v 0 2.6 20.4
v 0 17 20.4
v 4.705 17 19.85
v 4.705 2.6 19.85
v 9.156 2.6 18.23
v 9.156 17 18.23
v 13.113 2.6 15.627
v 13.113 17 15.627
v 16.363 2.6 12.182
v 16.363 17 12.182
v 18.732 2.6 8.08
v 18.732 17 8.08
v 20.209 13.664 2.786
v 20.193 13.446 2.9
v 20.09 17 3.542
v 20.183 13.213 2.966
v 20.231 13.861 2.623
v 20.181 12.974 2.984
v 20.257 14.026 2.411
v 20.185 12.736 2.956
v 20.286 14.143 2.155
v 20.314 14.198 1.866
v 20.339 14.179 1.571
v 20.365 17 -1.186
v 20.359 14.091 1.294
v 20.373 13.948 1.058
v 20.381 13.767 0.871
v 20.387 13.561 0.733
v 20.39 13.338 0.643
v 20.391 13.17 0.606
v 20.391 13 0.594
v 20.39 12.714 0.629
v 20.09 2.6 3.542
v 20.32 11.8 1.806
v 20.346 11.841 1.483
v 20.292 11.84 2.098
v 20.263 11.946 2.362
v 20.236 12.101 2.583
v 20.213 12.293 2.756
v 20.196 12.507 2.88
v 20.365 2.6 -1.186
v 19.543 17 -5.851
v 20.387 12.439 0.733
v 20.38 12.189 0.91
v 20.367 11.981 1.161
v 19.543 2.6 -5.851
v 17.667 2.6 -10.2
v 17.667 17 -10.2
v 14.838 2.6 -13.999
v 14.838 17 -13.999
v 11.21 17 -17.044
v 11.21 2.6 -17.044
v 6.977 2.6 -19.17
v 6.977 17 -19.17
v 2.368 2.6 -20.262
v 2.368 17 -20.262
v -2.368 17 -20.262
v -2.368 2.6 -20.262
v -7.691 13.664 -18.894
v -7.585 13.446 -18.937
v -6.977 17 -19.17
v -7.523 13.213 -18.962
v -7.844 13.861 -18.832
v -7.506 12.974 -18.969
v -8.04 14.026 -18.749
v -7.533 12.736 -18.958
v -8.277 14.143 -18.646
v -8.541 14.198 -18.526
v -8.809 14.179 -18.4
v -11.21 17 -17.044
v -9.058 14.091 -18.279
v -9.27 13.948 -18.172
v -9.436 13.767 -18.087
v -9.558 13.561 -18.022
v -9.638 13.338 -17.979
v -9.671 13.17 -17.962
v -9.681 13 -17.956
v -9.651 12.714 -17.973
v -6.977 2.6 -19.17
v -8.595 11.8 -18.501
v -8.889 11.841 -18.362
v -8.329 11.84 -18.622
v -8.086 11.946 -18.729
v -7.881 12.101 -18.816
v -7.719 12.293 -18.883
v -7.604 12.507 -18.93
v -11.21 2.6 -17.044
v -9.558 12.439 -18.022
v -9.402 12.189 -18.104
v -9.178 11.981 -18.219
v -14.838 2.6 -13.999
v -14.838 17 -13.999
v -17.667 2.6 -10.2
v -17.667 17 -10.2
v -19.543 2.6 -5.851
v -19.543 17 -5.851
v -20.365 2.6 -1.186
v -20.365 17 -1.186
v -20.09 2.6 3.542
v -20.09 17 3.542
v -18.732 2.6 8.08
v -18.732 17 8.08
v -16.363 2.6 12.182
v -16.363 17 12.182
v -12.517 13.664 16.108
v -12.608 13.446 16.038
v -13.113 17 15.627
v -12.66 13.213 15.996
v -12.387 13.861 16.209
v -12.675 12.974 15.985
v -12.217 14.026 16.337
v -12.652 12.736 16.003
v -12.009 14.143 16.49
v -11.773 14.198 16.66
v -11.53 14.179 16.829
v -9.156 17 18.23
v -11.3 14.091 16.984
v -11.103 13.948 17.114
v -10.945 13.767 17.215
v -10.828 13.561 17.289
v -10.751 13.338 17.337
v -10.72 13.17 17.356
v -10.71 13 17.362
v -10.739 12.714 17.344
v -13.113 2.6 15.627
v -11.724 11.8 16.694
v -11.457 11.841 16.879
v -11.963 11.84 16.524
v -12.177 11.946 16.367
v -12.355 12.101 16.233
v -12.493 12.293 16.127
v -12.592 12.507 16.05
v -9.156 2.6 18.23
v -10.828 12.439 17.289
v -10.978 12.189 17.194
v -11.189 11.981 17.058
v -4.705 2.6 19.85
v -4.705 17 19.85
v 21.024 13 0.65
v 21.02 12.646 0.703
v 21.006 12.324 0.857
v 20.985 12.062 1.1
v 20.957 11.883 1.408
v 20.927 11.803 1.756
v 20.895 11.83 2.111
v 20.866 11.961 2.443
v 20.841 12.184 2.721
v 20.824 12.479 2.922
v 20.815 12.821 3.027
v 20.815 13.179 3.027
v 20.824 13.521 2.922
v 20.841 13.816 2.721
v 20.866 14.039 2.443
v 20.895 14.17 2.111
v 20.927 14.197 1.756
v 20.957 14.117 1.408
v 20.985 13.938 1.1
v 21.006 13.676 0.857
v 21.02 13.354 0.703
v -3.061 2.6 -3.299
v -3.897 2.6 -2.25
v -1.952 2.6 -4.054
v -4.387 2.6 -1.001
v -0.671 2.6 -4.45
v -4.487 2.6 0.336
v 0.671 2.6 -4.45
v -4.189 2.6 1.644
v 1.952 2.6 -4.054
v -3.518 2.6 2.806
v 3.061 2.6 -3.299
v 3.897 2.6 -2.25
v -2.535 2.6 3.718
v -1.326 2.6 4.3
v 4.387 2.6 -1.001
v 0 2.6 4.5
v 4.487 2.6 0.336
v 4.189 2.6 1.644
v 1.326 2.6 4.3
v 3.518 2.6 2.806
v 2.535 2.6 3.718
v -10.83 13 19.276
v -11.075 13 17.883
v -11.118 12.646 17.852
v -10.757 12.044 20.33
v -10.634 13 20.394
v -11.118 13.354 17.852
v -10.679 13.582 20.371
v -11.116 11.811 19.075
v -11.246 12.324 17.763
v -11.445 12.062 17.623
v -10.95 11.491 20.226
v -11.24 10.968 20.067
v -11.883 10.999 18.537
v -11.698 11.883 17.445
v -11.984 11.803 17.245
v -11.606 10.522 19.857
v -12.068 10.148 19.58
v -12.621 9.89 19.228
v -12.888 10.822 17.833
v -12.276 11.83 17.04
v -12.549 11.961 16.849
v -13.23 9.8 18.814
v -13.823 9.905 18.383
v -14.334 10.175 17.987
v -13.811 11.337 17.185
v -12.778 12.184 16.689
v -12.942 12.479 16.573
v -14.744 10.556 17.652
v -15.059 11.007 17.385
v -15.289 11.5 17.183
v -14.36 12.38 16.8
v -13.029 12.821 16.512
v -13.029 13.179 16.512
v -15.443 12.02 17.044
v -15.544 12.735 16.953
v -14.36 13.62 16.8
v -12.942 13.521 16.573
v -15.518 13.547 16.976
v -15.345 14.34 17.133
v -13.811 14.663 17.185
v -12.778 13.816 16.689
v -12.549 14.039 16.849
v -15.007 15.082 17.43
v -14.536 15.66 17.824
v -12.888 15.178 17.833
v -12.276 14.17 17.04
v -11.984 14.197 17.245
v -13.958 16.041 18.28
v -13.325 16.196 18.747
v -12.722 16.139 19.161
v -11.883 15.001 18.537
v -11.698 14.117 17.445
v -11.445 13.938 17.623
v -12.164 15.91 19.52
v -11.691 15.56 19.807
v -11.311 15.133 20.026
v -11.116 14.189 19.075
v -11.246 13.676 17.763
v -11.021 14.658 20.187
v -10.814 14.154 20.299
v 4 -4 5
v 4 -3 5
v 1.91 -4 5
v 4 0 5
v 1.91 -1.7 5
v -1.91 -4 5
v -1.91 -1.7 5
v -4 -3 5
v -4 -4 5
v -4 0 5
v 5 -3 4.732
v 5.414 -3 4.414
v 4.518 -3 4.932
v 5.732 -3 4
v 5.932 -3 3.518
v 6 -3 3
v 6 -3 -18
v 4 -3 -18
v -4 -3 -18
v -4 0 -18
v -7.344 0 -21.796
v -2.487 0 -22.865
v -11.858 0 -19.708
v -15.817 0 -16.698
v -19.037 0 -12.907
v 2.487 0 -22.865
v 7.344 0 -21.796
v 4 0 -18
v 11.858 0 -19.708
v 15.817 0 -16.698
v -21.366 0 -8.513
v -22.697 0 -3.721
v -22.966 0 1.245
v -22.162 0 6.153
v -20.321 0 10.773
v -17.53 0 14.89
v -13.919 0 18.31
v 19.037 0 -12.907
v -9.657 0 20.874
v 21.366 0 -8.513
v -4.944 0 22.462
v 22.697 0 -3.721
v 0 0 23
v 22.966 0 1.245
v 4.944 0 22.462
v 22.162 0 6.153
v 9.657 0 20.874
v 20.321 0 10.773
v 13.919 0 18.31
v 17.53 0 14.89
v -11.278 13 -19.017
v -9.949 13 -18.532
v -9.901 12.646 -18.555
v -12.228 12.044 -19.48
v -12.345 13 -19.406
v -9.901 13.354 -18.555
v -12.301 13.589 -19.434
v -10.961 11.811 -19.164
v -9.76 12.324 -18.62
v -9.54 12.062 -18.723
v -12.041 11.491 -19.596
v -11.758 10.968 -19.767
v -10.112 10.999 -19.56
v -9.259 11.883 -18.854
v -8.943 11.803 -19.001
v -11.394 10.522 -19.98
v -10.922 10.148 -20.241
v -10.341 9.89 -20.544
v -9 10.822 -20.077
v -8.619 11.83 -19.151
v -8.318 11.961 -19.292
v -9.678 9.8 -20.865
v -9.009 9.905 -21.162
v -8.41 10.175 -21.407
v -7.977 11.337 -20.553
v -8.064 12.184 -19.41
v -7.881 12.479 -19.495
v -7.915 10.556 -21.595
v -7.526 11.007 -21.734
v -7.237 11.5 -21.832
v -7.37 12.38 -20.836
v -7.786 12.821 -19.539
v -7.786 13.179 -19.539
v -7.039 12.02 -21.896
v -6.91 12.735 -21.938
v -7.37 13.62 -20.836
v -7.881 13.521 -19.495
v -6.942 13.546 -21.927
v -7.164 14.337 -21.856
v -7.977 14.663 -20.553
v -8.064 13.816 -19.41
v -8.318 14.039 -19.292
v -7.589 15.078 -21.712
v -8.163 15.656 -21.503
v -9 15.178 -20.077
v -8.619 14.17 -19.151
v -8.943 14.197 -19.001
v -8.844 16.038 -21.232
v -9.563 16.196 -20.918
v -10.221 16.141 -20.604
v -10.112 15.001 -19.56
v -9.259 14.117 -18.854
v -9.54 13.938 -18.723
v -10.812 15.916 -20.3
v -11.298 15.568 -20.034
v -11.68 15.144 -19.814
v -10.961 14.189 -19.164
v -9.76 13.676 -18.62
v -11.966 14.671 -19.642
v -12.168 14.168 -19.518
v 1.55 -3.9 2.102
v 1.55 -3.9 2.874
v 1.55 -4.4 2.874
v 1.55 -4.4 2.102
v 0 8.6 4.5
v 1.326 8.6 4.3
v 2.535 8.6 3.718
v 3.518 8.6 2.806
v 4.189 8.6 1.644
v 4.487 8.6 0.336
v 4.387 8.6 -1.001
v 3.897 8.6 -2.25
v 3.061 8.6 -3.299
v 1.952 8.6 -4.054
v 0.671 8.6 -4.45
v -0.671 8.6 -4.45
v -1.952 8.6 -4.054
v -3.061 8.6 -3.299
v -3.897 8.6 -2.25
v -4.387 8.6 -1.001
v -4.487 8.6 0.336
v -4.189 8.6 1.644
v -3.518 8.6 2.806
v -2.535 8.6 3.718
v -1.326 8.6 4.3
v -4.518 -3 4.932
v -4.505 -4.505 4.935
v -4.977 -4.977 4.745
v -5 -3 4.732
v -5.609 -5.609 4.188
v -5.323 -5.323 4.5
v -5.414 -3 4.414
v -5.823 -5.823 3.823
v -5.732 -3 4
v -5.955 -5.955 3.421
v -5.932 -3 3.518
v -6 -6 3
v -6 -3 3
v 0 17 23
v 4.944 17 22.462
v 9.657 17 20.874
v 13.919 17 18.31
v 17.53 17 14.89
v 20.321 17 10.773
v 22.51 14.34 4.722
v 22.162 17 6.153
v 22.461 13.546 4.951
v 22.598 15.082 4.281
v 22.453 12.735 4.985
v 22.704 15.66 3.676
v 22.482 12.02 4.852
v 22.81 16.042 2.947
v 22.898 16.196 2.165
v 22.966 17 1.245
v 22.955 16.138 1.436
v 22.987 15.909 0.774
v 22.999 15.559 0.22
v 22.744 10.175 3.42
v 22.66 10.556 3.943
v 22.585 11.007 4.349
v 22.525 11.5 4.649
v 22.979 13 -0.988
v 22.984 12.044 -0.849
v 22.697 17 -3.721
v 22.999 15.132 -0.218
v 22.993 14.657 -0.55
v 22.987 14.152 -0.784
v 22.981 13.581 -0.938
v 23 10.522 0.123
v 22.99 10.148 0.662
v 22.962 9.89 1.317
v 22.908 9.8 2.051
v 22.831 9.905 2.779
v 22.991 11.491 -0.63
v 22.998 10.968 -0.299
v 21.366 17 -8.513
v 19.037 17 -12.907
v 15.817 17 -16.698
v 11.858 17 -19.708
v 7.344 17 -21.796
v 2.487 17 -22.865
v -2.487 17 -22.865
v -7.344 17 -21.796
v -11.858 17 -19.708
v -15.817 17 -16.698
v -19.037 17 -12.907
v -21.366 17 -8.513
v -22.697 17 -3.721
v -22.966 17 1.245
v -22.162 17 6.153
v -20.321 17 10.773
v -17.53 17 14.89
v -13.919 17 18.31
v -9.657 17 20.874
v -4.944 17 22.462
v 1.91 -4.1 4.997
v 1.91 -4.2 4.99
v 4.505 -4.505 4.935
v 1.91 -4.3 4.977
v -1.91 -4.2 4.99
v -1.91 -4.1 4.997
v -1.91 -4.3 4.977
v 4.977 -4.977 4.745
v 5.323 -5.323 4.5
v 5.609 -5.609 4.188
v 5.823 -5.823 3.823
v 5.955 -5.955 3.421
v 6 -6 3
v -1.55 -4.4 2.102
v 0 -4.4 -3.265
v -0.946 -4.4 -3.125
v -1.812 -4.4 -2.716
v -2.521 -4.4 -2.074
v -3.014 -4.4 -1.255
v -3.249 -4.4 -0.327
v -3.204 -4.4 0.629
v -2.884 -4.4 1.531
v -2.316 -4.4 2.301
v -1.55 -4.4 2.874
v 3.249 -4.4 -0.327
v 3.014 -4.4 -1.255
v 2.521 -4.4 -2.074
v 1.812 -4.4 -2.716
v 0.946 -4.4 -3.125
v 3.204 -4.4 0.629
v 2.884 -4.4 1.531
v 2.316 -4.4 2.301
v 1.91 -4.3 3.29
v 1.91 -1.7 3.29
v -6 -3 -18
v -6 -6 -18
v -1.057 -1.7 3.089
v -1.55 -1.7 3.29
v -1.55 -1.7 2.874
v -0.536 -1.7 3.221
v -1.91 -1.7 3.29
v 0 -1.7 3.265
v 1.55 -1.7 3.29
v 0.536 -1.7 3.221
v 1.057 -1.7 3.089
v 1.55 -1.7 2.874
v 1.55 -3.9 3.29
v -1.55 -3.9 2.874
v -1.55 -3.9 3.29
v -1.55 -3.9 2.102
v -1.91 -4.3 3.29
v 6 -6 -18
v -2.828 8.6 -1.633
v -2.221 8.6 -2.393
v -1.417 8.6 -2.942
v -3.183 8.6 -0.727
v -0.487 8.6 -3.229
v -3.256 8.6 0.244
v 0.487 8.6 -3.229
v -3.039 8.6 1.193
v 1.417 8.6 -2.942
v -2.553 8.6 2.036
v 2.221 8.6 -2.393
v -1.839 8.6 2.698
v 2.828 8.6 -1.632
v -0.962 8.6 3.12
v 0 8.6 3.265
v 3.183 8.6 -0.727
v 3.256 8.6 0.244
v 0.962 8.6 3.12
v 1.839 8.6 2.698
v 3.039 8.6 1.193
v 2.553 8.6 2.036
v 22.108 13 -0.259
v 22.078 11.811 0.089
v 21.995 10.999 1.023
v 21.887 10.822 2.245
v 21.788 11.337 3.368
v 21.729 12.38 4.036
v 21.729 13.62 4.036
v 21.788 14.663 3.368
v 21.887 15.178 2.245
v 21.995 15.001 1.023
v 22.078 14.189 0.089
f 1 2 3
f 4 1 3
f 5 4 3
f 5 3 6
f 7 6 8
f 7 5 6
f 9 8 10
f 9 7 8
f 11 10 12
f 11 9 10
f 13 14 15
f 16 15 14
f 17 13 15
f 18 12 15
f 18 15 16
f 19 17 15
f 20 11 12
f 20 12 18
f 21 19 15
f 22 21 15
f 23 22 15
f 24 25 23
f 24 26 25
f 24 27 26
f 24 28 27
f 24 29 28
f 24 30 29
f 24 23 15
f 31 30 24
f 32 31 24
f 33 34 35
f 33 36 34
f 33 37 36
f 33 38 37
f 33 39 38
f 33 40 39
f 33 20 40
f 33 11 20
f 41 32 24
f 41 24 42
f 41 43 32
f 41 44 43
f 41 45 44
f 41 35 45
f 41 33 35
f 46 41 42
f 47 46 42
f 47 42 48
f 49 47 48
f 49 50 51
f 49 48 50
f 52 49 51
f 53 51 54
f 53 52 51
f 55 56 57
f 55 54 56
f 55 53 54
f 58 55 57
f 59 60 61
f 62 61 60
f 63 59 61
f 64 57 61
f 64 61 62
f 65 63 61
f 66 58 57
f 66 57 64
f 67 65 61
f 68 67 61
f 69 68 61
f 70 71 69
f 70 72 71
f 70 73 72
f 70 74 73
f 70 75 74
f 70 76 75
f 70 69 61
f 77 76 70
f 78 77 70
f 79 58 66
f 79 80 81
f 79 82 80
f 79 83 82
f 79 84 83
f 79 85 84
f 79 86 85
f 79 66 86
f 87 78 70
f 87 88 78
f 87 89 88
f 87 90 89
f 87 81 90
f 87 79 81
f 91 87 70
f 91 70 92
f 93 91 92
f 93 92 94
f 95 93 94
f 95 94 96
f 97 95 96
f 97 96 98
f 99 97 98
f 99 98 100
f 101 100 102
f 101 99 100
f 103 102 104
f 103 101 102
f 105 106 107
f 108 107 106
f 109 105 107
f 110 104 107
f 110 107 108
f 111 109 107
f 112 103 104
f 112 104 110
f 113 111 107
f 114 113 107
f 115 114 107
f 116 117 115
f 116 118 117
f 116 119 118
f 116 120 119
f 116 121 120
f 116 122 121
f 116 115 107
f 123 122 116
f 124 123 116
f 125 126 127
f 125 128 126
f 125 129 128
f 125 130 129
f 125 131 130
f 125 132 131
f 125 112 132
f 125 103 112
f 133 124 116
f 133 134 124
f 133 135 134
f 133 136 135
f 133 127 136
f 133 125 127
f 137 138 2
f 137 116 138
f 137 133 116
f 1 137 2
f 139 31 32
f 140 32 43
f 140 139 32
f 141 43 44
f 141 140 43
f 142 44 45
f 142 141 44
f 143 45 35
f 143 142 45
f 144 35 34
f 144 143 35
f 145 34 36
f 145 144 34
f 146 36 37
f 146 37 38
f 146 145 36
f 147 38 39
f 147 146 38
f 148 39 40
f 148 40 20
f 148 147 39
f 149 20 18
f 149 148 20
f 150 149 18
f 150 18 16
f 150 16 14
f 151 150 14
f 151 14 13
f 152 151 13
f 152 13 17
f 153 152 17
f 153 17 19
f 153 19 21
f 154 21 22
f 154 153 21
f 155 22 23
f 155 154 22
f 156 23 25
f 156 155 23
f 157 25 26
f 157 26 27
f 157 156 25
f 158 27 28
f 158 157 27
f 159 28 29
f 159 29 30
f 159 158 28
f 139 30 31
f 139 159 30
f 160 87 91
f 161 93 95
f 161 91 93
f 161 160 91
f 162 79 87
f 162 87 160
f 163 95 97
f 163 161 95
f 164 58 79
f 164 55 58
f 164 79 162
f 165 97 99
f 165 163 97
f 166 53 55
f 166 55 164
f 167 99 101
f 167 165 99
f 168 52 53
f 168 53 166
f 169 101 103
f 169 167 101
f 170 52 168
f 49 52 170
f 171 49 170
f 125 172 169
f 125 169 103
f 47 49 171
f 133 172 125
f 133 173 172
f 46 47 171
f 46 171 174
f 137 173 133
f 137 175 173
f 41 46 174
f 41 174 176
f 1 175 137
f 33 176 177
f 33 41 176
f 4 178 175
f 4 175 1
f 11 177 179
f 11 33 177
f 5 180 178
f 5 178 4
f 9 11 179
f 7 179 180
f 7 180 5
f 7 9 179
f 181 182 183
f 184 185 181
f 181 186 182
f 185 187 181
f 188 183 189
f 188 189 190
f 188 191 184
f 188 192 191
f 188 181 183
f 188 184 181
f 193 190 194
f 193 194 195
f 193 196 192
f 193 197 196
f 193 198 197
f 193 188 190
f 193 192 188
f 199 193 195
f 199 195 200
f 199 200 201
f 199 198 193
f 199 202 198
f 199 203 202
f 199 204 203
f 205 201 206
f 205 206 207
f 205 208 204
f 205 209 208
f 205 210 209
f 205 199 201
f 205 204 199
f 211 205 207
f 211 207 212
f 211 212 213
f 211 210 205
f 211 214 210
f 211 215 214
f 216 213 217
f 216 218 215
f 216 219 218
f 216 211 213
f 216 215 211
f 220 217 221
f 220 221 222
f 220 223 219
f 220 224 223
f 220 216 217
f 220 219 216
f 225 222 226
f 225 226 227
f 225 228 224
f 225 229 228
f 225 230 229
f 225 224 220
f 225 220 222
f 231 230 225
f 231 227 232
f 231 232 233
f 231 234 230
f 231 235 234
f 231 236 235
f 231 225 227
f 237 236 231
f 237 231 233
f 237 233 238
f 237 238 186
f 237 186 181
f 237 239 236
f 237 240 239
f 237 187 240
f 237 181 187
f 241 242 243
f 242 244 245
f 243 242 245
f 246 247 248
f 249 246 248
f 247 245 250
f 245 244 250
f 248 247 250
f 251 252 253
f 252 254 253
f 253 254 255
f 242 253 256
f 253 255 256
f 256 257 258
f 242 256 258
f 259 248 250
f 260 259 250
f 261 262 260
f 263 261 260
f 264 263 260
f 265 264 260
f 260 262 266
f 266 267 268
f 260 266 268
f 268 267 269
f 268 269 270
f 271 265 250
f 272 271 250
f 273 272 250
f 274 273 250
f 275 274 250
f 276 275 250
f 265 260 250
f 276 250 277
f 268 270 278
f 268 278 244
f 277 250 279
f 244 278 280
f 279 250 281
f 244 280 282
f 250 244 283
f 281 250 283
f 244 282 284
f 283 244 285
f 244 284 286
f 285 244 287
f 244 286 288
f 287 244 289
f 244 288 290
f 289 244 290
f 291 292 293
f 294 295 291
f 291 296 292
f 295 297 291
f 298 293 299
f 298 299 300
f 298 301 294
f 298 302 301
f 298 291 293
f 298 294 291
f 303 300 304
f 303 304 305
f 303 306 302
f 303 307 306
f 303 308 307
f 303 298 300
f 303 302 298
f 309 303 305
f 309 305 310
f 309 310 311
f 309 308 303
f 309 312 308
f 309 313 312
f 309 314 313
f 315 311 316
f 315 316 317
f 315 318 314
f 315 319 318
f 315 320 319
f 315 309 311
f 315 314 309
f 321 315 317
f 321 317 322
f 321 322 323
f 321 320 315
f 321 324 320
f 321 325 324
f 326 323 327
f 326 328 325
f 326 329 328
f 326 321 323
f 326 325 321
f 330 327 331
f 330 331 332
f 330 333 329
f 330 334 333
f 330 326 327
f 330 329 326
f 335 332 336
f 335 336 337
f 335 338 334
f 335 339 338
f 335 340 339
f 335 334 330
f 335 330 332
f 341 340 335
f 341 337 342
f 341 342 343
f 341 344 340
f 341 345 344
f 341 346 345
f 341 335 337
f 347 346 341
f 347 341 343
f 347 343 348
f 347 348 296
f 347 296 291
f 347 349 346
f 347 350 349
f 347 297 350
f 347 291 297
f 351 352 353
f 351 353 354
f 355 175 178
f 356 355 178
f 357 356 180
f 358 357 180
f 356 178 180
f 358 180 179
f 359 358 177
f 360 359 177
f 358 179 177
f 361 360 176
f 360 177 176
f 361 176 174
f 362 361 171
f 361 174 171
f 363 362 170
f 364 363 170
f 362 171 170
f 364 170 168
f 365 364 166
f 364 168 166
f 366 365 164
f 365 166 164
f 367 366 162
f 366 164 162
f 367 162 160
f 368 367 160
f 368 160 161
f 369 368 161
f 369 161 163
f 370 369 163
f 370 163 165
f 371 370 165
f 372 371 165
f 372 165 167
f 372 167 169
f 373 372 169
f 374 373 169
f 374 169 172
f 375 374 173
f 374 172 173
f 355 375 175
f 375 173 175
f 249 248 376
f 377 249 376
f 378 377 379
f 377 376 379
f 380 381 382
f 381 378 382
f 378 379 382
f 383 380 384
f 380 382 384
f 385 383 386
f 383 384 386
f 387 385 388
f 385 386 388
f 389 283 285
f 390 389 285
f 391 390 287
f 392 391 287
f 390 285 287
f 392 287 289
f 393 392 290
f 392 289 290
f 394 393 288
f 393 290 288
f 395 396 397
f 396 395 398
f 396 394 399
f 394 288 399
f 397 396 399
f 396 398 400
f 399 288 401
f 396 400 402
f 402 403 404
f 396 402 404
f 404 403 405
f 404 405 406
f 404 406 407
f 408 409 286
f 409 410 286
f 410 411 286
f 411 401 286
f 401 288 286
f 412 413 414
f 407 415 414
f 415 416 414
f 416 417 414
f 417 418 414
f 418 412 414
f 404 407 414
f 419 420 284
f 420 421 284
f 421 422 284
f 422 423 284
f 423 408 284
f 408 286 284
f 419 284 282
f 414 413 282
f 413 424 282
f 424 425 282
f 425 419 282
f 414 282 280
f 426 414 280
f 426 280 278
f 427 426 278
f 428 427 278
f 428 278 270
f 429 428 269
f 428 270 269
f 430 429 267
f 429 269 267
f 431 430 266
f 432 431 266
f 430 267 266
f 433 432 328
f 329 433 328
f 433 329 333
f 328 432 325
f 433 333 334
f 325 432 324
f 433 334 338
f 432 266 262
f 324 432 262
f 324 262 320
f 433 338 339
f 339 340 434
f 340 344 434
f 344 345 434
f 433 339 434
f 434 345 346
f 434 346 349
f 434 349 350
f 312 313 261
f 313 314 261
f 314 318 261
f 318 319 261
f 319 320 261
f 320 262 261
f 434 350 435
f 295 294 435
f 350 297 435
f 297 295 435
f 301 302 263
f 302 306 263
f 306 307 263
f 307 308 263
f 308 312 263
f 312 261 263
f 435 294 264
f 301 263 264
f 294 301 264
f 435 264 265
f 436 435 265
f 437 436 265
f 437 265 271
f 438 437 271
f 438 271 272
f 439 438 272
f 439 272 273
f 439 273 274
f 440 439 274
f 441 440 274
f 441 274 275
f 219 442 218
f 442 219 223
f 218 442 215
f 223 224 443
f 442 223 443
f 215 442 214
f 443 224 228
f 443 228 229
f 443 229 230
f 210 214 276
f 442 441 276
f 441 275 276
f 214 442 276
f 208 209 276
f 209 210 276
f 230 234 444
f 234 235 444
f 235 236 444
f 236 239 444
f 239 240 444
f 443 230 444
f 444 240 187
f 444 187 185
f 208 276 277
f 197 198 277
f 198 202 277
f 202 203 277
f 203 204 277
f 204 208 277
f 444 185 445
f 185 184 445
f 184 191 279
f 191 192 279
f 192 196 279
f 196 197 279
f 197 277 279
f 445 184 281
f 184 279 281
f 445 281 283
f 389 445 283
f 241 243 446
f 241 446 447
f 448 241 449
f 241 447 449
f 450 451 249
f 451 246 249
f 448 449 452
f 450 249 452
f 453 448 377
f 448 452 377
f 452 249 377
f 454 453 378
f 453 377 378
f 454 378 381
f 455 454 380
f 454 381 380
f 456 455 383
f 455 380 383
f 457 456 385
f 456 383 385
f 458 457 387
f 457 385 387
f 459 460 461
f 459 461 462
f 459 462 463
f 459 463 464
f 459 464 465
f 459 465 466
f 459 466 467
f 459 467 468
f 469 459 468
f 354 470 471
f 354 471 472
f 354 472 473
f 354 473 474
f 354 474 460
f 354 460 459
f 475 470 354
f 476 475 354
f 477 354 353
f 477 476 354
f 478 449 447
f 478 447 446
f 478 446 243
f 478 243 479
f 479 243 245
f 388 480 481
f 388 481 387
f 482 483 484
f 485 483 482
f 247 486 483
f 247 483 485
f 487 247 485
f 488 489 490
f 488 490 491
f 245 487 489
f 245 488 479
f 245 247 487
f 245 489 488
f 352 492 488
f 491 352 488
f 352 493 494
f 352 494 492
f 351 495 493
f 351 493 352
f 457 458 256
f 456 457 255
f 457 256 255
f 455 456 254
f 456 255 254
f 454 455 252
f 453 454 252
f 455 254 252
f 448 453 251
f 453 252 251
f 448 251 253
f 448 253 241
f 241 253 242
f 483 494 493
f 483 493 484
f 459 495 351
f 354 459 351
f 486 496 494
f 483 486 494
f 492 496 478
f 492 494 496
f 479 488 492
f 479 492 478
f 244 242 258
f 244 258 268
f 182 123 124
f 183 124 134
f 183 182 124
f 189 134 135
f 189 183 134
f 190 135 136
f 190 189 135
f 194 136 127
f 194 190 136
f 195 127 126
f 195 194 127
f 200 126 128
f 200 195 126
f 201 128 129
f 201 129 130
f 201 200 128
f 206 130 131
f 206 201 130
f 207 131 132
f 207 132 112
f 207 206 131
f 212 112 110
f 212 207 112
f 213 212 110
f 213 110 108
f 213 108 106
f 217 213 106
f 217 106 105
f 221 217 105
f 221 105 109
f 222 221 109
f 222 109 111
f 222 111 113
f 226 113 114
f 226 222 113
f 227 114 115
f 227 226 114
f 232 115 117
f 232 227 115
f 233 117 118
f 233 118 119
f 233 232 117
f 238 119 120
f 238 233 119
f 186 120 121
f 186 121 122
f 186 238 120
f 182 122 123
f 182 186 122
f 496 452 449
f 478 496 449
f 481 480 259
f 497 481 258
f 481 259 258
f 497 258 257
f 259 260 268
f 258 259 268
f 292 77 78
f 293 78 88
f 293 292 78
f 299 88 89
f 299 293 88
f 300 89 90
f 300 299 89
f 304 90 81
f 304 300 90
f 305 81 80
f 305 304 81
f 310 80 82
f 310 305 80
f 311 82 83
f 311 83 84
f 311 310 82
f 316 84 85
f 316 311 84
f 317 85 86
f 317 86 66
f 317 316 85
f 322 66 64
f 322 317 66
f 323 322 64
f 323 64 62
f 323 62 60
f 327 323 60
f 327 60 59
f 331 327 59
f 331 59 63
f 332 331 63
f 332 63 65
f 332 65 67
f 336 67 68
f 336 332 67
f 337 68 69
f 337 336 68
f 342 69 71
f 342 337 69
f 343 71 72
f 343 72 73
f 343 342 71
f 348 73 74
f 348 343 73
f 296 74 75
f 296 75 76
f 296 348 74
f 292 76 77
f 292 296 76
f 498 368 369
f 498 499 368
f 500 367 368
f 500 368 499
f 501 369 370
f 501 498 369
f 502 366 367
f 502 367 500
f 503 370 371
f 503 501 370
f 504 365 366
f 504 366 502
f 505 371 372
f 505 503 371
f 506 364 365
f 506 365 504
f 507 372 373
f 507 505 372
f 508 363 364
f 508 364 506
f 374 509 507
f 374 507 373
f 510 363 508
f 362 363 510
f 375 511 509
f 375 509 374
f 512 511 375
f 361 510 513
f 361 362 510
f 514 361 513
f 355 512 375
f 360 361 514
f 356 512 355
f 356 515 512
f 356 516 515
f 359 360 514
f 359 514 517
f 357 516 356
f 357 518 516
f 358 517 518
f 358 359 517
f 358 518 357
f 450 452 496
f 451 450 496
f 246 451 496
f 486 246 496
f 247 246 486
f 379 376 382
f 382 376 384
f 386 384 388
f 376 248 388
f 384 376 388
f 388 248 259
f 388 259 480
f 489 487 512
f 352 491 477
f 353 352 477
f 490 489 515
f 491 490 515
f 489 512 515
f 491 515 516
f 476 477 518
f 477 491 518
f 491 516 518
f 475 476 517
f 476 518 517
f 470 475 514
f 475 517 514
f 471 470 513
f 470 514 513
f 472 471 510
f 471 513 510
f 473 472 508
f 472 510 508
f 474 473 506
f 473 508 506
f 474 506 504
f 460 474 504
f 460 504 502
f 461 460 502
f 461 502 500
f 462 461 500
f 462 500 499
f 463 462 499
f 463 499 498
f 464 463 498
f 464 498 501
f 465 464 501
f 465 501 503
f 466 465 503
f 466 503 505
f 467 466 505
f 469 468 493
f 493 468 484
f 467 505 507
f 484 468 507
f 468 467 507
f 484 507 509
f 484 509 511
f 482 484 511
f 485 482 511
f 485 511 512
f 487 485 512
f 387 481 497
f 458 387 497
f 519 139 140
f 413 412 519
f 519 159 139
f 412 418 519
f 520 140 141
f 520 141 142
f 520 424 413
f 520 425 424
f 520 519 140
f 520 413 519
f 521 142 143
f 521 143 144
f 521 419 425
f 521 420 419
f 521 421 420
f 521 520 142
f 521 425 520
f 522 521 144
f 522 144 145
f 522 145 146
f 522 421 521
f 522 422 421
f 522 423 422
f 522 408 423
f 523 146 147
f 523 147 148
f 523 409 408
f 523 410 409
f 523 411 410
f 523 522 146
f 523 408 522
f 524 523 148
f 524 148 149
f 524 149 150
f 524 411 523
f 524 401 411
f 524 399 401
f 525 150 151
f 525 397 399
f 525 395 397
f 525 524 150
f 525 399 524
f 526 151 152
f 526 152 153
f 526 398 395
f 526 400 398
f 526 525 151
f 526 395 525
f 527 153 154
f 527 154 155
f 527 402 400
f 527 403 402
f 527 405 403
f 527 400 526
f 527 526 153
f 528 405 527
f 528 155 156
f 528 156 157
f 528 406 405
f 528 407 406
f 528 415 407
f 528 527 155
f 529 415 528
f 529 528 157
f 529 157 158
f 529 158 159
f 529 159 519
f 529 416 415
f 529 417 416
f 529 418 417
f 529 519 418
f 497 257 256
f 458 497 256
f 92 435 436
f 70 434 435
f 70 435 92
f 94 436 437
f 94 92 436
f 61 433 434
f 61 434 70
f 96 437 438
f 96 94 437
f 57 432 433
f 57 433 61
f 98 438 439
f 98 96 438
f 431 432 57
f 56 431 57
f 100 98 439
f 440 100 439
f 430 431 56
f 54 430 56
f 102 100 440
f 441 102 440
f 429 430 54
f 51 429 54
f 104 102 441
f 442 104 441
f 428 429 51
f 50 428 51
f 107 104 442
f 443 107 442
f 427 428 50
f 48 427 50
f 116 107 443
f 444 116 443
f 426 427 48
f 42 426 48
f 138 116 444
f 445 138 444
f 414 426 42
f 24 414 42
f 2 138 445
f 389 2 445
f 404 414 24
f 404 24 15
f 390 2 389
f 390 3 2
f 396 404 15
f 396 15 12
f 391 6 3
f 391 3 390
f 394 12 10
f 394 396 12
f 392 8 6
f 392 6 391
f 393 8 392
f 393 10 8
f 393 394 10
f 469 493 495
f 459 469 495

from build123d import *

# Parameters (mm, degrees)
SKETCH1_R           = 23
BOSS_EXTRUDE1_DEPTH = 17
SHELL1_T            = -2.6
SKETCH2_W           = 6
SKETCH2_H           = 23
BOSS_EXTRUDE2_DEPTH = 6
SKETCH3_W           = 2
SKETCH3_H           = 3
CUT_EXTRUDE1_DEPTH  = 50.989999
SKETCH4_R           = 4.5
BOSS_EXTRUDE3_DEPTH = 6
SKETCH5_R           = 3.265
CUT_EXTRUDE2_DEPTH  = 13
SKETCH7_W           = 3.82
SKETCH7_H           = 2.6
CUT_EXTRUDE3_DEPTH  = 1.71
CIRPATTERN1_COUNT   = 3
SKETCH10_W          = 3.1
SKETCH10_H          = 2.2
CUT_EXTRUDE4_DEPTH  = 3
BOSS_EXTRUDE6_REACH = 40.663
SKETCH11_W          = 3.1
SKETCH11_H          = 1.188042875
FILLET1_R           = 2


with BuildPart() as part:
    # Sketch1 → Boss-Extrude1 (new body)
    with BuildSketch(Plane(origin=(0, 0, 0), x_dir=(1, 0, 0), z_dir=(0, 1, 0))):
        with Locations(Location((0, 0, 0), (0, 0, 270))):
            Circle(SKETCH1_R)
    extrude(amount=BOSS_EXTRUDE1_DEPTH)

    # Shell1
    shell1_openings = [part.faces().sort_by_distance(p)[0] for p in [
        (0, 17, 0),
    ]]
    offset(amount=SHELL1_T, openings=shell1_openings, kind=Kind.INTERSECTION)

    # Sketch2 → Boss-Extrude2 (add)
    with BuildSketch(Plane.XZ):
        with Locations((-3, -6.5)):
            Rectangle(SKETCH2_W, SKETCH2_H)
        with Locations((3, -6.5)):
            Rectangle(SKETCH2_W, SKETCH2_H)
    extrude(amount=BOSS_EXTRUDE2_DEPTH)

    # Sketch3 → Cut-Extrude1 (cut, through all)
    with BuildSketch(Plane(origin=(0, 0, -18), x_dir=(-1, 0, 0), z_dir=(0, 0, -1))):
        with Locations((-5, -1.5)):
            Rectangle(SKETCH3_W, SKETCH3_H)
        with Locations((5, -1.5)):
            Rectangle(SKETCH3_W, SKETCH3_H)
    extrude(amount=-CUT_EXTRUDE1_DEPTH, mode=Mode.SUBTRACT)

    # Sketch4 → Boss-Extrude3 (add)
    with BuildSketch(Plane(origin=(0, 2.6, 0), x_dir=(1, 0, 0), z_dir=(0, 1, 0))):
        with Locations(Location((0, 0, 0), (0, 0, 270))):
            Circle(SKETCH4_R)
    extrude(amount=BOSS_EXTRUDE3_DEPTH)

    # Sketch5 → Cut-Extrude2 (cut)
    with BuildSketch(Plane(origin=(0, 8.6, 0), x_dir=(1, 0, 0), z_dir=(0, 1, 0))):
        with Locations(Location((0, 0, 0), (0, 0, 270))):
            Circle(SKETCH5_R)
    extrude(amount=-CUT_EXTRUDE2_DEPTH, mode=Mode.SUBTRACT)

    # Sketch7 → Cut-Extrude3 (cut)
    with BuildSketch(Plane.XY.offset(5)):
        with Locations((0, -3)):
            Rectangle(SKETCH7_W, SKETCH7_H)
    extrude(amount=-CUT_EXTRUDE3_DEPTH, mode=Mode.SUBTRACT)

    # Sketch9 → CSK SLOT for M2 Countersunk Flat Head Screw1 (revolve, cut)
    with BuildSketch(Plane(origin=(22.911051483, 13, 2.020821599), x_dir=(0.08786180866791495, 0, -0.9961326731804369), z_dir=(0, 1, 0))):
        Polygon((0, 0), (0, 5.721032743), (1.2, 5), (1.2, 2), (3.2, 0), align=None)
    csk_slot_for_m2_countersunk_flat_head_sc = revolve(axis=Axis((29.236493958, 13, 2.578744084), (-0.9961326731804366, 0, -0.08786180866791493)), mode=Mode.SUBTRACT)

    # CirPattern1: CSK SLOT for M2 Countersunk Flat Head Screw1 ×3 about axis
    cirpattern1_axis = Axis((0, 17, 0), (0, -1, 0))
    for i in range(1, CIRPATTERN1_COUNT):
        add(csk_slot_for_m2_countersunk_flat_head_sc.rotate(cirpattern1_axis, i * 360 / CIRPATTERN1_COUNT), mode=Mode.SUBTRACT)

    # Sketch10 → Cut-Extrude4 (cut)
    with BuildSketch(Plane.XY.offset(3.29)):
        with Locations((0, -2.8)):
            Rectangle(SKETCH10_W, SKETCH10_H)
    extrude(amount=-CUT_EXTRUDE4_DEPTH, mode=Mode.SUBTRACT)

    # Sketch11 → Boss-Extrude6 (add, up to next)
    with BuildSketch(Plane(origin=(0, -3.9, 0), x_dir=(1, 0, 0), z_dir=(0, 1, 0)), mode=Mode.PRIVATE) as boss_extrude6_sk1:
        with Locations((0, -2.695978563)):
            Rectangle(SKETCH11_W, SKETCH11_H)
    boss_extrude6_tool1 = extrude(boss_extrude6_sk1.sketch, amount=-BOSS_EXTRUDE6_REACH, mode=Mode.PRIVATE) - part.part
    add(boss_extrude6_tool1.solids().sort_by_distance((0, -3.9, 2.695979))[0])

    # Fillet1
    # the kernel refuses this fillet: 2 mm, written as the material it takes off along each edge
    with BuildSketch(Plane(origin=(-6, 2, 5), x_dir=(1, 0, 0), z_dir=(0, -1, 0))) as fillet1_piece_1_section:
        with BuildLine():
            CenterArc((FILLET1_R, -FILLET1_R), FILLET1_R, 90, 90)
            Line((0, -FILLET1_R), (0, 0))
            Line((0, 0), (FILLET1_R, 0))
        make_face()
    fillet1_piece_1 = extrude(amount=13, mode=Mode.PRIVATE)
    fillet1_piece_1 = split(fillet1_piece_1, bisect_by=Plane(origin=(-5.547209771, 0, 4.547209771), z_dir=(0, -1, 0)), keep=Keep.TOP, mode=Mode.PRIVATE)
    add(fillet1_piece_1, mode=Mode.SUBTRACT)
    with BuildSketch(Plane(origin=(-11, -6, 5), x_dir=(0, 1, 0), z_dir=(1, 0, 0))) as fillet1_piece_2:
        with BuildLine():
            CenterArc((FILLET1_R, -FILLET1_R), FILLET1_R, 90, 90)
            Line((0, -FILLET1_R), (0, 0))
            Line((0, 0), (FILLET1_R, 0))
        make_face()
    extrude(amount=22, mode=Mode.SUBTRACT)
    with BuildSketch(Plane(origin=(6, 2, 5), x_dir=(-1, 0, 0), z_dir=(0, -1, 0))) as fillet1_piece_3_section:
        with BuildLine():
            CenterArc((FILLET1_R, FILLET1_R), FILLET1_R, 180, 90)
            Line((0, FILLET1_R), (0, 0))
            Line((0, 0), (FILLET1_R, 0))
        make_face()
    fillet1_piece_3 = extrude(amount=13, mode=Mode.PRIVATE)
    fillet1_piece_3 = split(fillet1_piece_3, bisect_by=Plane(origin=(5.547209771, 0, 4.547209771), z_dir=(0, -1, 0)), keep=Keep.TOP, mode=Mode.PRIVATE)
    add(fillet1_piece_3, mode=Mode.SUBTRACT)


solid = part.part
